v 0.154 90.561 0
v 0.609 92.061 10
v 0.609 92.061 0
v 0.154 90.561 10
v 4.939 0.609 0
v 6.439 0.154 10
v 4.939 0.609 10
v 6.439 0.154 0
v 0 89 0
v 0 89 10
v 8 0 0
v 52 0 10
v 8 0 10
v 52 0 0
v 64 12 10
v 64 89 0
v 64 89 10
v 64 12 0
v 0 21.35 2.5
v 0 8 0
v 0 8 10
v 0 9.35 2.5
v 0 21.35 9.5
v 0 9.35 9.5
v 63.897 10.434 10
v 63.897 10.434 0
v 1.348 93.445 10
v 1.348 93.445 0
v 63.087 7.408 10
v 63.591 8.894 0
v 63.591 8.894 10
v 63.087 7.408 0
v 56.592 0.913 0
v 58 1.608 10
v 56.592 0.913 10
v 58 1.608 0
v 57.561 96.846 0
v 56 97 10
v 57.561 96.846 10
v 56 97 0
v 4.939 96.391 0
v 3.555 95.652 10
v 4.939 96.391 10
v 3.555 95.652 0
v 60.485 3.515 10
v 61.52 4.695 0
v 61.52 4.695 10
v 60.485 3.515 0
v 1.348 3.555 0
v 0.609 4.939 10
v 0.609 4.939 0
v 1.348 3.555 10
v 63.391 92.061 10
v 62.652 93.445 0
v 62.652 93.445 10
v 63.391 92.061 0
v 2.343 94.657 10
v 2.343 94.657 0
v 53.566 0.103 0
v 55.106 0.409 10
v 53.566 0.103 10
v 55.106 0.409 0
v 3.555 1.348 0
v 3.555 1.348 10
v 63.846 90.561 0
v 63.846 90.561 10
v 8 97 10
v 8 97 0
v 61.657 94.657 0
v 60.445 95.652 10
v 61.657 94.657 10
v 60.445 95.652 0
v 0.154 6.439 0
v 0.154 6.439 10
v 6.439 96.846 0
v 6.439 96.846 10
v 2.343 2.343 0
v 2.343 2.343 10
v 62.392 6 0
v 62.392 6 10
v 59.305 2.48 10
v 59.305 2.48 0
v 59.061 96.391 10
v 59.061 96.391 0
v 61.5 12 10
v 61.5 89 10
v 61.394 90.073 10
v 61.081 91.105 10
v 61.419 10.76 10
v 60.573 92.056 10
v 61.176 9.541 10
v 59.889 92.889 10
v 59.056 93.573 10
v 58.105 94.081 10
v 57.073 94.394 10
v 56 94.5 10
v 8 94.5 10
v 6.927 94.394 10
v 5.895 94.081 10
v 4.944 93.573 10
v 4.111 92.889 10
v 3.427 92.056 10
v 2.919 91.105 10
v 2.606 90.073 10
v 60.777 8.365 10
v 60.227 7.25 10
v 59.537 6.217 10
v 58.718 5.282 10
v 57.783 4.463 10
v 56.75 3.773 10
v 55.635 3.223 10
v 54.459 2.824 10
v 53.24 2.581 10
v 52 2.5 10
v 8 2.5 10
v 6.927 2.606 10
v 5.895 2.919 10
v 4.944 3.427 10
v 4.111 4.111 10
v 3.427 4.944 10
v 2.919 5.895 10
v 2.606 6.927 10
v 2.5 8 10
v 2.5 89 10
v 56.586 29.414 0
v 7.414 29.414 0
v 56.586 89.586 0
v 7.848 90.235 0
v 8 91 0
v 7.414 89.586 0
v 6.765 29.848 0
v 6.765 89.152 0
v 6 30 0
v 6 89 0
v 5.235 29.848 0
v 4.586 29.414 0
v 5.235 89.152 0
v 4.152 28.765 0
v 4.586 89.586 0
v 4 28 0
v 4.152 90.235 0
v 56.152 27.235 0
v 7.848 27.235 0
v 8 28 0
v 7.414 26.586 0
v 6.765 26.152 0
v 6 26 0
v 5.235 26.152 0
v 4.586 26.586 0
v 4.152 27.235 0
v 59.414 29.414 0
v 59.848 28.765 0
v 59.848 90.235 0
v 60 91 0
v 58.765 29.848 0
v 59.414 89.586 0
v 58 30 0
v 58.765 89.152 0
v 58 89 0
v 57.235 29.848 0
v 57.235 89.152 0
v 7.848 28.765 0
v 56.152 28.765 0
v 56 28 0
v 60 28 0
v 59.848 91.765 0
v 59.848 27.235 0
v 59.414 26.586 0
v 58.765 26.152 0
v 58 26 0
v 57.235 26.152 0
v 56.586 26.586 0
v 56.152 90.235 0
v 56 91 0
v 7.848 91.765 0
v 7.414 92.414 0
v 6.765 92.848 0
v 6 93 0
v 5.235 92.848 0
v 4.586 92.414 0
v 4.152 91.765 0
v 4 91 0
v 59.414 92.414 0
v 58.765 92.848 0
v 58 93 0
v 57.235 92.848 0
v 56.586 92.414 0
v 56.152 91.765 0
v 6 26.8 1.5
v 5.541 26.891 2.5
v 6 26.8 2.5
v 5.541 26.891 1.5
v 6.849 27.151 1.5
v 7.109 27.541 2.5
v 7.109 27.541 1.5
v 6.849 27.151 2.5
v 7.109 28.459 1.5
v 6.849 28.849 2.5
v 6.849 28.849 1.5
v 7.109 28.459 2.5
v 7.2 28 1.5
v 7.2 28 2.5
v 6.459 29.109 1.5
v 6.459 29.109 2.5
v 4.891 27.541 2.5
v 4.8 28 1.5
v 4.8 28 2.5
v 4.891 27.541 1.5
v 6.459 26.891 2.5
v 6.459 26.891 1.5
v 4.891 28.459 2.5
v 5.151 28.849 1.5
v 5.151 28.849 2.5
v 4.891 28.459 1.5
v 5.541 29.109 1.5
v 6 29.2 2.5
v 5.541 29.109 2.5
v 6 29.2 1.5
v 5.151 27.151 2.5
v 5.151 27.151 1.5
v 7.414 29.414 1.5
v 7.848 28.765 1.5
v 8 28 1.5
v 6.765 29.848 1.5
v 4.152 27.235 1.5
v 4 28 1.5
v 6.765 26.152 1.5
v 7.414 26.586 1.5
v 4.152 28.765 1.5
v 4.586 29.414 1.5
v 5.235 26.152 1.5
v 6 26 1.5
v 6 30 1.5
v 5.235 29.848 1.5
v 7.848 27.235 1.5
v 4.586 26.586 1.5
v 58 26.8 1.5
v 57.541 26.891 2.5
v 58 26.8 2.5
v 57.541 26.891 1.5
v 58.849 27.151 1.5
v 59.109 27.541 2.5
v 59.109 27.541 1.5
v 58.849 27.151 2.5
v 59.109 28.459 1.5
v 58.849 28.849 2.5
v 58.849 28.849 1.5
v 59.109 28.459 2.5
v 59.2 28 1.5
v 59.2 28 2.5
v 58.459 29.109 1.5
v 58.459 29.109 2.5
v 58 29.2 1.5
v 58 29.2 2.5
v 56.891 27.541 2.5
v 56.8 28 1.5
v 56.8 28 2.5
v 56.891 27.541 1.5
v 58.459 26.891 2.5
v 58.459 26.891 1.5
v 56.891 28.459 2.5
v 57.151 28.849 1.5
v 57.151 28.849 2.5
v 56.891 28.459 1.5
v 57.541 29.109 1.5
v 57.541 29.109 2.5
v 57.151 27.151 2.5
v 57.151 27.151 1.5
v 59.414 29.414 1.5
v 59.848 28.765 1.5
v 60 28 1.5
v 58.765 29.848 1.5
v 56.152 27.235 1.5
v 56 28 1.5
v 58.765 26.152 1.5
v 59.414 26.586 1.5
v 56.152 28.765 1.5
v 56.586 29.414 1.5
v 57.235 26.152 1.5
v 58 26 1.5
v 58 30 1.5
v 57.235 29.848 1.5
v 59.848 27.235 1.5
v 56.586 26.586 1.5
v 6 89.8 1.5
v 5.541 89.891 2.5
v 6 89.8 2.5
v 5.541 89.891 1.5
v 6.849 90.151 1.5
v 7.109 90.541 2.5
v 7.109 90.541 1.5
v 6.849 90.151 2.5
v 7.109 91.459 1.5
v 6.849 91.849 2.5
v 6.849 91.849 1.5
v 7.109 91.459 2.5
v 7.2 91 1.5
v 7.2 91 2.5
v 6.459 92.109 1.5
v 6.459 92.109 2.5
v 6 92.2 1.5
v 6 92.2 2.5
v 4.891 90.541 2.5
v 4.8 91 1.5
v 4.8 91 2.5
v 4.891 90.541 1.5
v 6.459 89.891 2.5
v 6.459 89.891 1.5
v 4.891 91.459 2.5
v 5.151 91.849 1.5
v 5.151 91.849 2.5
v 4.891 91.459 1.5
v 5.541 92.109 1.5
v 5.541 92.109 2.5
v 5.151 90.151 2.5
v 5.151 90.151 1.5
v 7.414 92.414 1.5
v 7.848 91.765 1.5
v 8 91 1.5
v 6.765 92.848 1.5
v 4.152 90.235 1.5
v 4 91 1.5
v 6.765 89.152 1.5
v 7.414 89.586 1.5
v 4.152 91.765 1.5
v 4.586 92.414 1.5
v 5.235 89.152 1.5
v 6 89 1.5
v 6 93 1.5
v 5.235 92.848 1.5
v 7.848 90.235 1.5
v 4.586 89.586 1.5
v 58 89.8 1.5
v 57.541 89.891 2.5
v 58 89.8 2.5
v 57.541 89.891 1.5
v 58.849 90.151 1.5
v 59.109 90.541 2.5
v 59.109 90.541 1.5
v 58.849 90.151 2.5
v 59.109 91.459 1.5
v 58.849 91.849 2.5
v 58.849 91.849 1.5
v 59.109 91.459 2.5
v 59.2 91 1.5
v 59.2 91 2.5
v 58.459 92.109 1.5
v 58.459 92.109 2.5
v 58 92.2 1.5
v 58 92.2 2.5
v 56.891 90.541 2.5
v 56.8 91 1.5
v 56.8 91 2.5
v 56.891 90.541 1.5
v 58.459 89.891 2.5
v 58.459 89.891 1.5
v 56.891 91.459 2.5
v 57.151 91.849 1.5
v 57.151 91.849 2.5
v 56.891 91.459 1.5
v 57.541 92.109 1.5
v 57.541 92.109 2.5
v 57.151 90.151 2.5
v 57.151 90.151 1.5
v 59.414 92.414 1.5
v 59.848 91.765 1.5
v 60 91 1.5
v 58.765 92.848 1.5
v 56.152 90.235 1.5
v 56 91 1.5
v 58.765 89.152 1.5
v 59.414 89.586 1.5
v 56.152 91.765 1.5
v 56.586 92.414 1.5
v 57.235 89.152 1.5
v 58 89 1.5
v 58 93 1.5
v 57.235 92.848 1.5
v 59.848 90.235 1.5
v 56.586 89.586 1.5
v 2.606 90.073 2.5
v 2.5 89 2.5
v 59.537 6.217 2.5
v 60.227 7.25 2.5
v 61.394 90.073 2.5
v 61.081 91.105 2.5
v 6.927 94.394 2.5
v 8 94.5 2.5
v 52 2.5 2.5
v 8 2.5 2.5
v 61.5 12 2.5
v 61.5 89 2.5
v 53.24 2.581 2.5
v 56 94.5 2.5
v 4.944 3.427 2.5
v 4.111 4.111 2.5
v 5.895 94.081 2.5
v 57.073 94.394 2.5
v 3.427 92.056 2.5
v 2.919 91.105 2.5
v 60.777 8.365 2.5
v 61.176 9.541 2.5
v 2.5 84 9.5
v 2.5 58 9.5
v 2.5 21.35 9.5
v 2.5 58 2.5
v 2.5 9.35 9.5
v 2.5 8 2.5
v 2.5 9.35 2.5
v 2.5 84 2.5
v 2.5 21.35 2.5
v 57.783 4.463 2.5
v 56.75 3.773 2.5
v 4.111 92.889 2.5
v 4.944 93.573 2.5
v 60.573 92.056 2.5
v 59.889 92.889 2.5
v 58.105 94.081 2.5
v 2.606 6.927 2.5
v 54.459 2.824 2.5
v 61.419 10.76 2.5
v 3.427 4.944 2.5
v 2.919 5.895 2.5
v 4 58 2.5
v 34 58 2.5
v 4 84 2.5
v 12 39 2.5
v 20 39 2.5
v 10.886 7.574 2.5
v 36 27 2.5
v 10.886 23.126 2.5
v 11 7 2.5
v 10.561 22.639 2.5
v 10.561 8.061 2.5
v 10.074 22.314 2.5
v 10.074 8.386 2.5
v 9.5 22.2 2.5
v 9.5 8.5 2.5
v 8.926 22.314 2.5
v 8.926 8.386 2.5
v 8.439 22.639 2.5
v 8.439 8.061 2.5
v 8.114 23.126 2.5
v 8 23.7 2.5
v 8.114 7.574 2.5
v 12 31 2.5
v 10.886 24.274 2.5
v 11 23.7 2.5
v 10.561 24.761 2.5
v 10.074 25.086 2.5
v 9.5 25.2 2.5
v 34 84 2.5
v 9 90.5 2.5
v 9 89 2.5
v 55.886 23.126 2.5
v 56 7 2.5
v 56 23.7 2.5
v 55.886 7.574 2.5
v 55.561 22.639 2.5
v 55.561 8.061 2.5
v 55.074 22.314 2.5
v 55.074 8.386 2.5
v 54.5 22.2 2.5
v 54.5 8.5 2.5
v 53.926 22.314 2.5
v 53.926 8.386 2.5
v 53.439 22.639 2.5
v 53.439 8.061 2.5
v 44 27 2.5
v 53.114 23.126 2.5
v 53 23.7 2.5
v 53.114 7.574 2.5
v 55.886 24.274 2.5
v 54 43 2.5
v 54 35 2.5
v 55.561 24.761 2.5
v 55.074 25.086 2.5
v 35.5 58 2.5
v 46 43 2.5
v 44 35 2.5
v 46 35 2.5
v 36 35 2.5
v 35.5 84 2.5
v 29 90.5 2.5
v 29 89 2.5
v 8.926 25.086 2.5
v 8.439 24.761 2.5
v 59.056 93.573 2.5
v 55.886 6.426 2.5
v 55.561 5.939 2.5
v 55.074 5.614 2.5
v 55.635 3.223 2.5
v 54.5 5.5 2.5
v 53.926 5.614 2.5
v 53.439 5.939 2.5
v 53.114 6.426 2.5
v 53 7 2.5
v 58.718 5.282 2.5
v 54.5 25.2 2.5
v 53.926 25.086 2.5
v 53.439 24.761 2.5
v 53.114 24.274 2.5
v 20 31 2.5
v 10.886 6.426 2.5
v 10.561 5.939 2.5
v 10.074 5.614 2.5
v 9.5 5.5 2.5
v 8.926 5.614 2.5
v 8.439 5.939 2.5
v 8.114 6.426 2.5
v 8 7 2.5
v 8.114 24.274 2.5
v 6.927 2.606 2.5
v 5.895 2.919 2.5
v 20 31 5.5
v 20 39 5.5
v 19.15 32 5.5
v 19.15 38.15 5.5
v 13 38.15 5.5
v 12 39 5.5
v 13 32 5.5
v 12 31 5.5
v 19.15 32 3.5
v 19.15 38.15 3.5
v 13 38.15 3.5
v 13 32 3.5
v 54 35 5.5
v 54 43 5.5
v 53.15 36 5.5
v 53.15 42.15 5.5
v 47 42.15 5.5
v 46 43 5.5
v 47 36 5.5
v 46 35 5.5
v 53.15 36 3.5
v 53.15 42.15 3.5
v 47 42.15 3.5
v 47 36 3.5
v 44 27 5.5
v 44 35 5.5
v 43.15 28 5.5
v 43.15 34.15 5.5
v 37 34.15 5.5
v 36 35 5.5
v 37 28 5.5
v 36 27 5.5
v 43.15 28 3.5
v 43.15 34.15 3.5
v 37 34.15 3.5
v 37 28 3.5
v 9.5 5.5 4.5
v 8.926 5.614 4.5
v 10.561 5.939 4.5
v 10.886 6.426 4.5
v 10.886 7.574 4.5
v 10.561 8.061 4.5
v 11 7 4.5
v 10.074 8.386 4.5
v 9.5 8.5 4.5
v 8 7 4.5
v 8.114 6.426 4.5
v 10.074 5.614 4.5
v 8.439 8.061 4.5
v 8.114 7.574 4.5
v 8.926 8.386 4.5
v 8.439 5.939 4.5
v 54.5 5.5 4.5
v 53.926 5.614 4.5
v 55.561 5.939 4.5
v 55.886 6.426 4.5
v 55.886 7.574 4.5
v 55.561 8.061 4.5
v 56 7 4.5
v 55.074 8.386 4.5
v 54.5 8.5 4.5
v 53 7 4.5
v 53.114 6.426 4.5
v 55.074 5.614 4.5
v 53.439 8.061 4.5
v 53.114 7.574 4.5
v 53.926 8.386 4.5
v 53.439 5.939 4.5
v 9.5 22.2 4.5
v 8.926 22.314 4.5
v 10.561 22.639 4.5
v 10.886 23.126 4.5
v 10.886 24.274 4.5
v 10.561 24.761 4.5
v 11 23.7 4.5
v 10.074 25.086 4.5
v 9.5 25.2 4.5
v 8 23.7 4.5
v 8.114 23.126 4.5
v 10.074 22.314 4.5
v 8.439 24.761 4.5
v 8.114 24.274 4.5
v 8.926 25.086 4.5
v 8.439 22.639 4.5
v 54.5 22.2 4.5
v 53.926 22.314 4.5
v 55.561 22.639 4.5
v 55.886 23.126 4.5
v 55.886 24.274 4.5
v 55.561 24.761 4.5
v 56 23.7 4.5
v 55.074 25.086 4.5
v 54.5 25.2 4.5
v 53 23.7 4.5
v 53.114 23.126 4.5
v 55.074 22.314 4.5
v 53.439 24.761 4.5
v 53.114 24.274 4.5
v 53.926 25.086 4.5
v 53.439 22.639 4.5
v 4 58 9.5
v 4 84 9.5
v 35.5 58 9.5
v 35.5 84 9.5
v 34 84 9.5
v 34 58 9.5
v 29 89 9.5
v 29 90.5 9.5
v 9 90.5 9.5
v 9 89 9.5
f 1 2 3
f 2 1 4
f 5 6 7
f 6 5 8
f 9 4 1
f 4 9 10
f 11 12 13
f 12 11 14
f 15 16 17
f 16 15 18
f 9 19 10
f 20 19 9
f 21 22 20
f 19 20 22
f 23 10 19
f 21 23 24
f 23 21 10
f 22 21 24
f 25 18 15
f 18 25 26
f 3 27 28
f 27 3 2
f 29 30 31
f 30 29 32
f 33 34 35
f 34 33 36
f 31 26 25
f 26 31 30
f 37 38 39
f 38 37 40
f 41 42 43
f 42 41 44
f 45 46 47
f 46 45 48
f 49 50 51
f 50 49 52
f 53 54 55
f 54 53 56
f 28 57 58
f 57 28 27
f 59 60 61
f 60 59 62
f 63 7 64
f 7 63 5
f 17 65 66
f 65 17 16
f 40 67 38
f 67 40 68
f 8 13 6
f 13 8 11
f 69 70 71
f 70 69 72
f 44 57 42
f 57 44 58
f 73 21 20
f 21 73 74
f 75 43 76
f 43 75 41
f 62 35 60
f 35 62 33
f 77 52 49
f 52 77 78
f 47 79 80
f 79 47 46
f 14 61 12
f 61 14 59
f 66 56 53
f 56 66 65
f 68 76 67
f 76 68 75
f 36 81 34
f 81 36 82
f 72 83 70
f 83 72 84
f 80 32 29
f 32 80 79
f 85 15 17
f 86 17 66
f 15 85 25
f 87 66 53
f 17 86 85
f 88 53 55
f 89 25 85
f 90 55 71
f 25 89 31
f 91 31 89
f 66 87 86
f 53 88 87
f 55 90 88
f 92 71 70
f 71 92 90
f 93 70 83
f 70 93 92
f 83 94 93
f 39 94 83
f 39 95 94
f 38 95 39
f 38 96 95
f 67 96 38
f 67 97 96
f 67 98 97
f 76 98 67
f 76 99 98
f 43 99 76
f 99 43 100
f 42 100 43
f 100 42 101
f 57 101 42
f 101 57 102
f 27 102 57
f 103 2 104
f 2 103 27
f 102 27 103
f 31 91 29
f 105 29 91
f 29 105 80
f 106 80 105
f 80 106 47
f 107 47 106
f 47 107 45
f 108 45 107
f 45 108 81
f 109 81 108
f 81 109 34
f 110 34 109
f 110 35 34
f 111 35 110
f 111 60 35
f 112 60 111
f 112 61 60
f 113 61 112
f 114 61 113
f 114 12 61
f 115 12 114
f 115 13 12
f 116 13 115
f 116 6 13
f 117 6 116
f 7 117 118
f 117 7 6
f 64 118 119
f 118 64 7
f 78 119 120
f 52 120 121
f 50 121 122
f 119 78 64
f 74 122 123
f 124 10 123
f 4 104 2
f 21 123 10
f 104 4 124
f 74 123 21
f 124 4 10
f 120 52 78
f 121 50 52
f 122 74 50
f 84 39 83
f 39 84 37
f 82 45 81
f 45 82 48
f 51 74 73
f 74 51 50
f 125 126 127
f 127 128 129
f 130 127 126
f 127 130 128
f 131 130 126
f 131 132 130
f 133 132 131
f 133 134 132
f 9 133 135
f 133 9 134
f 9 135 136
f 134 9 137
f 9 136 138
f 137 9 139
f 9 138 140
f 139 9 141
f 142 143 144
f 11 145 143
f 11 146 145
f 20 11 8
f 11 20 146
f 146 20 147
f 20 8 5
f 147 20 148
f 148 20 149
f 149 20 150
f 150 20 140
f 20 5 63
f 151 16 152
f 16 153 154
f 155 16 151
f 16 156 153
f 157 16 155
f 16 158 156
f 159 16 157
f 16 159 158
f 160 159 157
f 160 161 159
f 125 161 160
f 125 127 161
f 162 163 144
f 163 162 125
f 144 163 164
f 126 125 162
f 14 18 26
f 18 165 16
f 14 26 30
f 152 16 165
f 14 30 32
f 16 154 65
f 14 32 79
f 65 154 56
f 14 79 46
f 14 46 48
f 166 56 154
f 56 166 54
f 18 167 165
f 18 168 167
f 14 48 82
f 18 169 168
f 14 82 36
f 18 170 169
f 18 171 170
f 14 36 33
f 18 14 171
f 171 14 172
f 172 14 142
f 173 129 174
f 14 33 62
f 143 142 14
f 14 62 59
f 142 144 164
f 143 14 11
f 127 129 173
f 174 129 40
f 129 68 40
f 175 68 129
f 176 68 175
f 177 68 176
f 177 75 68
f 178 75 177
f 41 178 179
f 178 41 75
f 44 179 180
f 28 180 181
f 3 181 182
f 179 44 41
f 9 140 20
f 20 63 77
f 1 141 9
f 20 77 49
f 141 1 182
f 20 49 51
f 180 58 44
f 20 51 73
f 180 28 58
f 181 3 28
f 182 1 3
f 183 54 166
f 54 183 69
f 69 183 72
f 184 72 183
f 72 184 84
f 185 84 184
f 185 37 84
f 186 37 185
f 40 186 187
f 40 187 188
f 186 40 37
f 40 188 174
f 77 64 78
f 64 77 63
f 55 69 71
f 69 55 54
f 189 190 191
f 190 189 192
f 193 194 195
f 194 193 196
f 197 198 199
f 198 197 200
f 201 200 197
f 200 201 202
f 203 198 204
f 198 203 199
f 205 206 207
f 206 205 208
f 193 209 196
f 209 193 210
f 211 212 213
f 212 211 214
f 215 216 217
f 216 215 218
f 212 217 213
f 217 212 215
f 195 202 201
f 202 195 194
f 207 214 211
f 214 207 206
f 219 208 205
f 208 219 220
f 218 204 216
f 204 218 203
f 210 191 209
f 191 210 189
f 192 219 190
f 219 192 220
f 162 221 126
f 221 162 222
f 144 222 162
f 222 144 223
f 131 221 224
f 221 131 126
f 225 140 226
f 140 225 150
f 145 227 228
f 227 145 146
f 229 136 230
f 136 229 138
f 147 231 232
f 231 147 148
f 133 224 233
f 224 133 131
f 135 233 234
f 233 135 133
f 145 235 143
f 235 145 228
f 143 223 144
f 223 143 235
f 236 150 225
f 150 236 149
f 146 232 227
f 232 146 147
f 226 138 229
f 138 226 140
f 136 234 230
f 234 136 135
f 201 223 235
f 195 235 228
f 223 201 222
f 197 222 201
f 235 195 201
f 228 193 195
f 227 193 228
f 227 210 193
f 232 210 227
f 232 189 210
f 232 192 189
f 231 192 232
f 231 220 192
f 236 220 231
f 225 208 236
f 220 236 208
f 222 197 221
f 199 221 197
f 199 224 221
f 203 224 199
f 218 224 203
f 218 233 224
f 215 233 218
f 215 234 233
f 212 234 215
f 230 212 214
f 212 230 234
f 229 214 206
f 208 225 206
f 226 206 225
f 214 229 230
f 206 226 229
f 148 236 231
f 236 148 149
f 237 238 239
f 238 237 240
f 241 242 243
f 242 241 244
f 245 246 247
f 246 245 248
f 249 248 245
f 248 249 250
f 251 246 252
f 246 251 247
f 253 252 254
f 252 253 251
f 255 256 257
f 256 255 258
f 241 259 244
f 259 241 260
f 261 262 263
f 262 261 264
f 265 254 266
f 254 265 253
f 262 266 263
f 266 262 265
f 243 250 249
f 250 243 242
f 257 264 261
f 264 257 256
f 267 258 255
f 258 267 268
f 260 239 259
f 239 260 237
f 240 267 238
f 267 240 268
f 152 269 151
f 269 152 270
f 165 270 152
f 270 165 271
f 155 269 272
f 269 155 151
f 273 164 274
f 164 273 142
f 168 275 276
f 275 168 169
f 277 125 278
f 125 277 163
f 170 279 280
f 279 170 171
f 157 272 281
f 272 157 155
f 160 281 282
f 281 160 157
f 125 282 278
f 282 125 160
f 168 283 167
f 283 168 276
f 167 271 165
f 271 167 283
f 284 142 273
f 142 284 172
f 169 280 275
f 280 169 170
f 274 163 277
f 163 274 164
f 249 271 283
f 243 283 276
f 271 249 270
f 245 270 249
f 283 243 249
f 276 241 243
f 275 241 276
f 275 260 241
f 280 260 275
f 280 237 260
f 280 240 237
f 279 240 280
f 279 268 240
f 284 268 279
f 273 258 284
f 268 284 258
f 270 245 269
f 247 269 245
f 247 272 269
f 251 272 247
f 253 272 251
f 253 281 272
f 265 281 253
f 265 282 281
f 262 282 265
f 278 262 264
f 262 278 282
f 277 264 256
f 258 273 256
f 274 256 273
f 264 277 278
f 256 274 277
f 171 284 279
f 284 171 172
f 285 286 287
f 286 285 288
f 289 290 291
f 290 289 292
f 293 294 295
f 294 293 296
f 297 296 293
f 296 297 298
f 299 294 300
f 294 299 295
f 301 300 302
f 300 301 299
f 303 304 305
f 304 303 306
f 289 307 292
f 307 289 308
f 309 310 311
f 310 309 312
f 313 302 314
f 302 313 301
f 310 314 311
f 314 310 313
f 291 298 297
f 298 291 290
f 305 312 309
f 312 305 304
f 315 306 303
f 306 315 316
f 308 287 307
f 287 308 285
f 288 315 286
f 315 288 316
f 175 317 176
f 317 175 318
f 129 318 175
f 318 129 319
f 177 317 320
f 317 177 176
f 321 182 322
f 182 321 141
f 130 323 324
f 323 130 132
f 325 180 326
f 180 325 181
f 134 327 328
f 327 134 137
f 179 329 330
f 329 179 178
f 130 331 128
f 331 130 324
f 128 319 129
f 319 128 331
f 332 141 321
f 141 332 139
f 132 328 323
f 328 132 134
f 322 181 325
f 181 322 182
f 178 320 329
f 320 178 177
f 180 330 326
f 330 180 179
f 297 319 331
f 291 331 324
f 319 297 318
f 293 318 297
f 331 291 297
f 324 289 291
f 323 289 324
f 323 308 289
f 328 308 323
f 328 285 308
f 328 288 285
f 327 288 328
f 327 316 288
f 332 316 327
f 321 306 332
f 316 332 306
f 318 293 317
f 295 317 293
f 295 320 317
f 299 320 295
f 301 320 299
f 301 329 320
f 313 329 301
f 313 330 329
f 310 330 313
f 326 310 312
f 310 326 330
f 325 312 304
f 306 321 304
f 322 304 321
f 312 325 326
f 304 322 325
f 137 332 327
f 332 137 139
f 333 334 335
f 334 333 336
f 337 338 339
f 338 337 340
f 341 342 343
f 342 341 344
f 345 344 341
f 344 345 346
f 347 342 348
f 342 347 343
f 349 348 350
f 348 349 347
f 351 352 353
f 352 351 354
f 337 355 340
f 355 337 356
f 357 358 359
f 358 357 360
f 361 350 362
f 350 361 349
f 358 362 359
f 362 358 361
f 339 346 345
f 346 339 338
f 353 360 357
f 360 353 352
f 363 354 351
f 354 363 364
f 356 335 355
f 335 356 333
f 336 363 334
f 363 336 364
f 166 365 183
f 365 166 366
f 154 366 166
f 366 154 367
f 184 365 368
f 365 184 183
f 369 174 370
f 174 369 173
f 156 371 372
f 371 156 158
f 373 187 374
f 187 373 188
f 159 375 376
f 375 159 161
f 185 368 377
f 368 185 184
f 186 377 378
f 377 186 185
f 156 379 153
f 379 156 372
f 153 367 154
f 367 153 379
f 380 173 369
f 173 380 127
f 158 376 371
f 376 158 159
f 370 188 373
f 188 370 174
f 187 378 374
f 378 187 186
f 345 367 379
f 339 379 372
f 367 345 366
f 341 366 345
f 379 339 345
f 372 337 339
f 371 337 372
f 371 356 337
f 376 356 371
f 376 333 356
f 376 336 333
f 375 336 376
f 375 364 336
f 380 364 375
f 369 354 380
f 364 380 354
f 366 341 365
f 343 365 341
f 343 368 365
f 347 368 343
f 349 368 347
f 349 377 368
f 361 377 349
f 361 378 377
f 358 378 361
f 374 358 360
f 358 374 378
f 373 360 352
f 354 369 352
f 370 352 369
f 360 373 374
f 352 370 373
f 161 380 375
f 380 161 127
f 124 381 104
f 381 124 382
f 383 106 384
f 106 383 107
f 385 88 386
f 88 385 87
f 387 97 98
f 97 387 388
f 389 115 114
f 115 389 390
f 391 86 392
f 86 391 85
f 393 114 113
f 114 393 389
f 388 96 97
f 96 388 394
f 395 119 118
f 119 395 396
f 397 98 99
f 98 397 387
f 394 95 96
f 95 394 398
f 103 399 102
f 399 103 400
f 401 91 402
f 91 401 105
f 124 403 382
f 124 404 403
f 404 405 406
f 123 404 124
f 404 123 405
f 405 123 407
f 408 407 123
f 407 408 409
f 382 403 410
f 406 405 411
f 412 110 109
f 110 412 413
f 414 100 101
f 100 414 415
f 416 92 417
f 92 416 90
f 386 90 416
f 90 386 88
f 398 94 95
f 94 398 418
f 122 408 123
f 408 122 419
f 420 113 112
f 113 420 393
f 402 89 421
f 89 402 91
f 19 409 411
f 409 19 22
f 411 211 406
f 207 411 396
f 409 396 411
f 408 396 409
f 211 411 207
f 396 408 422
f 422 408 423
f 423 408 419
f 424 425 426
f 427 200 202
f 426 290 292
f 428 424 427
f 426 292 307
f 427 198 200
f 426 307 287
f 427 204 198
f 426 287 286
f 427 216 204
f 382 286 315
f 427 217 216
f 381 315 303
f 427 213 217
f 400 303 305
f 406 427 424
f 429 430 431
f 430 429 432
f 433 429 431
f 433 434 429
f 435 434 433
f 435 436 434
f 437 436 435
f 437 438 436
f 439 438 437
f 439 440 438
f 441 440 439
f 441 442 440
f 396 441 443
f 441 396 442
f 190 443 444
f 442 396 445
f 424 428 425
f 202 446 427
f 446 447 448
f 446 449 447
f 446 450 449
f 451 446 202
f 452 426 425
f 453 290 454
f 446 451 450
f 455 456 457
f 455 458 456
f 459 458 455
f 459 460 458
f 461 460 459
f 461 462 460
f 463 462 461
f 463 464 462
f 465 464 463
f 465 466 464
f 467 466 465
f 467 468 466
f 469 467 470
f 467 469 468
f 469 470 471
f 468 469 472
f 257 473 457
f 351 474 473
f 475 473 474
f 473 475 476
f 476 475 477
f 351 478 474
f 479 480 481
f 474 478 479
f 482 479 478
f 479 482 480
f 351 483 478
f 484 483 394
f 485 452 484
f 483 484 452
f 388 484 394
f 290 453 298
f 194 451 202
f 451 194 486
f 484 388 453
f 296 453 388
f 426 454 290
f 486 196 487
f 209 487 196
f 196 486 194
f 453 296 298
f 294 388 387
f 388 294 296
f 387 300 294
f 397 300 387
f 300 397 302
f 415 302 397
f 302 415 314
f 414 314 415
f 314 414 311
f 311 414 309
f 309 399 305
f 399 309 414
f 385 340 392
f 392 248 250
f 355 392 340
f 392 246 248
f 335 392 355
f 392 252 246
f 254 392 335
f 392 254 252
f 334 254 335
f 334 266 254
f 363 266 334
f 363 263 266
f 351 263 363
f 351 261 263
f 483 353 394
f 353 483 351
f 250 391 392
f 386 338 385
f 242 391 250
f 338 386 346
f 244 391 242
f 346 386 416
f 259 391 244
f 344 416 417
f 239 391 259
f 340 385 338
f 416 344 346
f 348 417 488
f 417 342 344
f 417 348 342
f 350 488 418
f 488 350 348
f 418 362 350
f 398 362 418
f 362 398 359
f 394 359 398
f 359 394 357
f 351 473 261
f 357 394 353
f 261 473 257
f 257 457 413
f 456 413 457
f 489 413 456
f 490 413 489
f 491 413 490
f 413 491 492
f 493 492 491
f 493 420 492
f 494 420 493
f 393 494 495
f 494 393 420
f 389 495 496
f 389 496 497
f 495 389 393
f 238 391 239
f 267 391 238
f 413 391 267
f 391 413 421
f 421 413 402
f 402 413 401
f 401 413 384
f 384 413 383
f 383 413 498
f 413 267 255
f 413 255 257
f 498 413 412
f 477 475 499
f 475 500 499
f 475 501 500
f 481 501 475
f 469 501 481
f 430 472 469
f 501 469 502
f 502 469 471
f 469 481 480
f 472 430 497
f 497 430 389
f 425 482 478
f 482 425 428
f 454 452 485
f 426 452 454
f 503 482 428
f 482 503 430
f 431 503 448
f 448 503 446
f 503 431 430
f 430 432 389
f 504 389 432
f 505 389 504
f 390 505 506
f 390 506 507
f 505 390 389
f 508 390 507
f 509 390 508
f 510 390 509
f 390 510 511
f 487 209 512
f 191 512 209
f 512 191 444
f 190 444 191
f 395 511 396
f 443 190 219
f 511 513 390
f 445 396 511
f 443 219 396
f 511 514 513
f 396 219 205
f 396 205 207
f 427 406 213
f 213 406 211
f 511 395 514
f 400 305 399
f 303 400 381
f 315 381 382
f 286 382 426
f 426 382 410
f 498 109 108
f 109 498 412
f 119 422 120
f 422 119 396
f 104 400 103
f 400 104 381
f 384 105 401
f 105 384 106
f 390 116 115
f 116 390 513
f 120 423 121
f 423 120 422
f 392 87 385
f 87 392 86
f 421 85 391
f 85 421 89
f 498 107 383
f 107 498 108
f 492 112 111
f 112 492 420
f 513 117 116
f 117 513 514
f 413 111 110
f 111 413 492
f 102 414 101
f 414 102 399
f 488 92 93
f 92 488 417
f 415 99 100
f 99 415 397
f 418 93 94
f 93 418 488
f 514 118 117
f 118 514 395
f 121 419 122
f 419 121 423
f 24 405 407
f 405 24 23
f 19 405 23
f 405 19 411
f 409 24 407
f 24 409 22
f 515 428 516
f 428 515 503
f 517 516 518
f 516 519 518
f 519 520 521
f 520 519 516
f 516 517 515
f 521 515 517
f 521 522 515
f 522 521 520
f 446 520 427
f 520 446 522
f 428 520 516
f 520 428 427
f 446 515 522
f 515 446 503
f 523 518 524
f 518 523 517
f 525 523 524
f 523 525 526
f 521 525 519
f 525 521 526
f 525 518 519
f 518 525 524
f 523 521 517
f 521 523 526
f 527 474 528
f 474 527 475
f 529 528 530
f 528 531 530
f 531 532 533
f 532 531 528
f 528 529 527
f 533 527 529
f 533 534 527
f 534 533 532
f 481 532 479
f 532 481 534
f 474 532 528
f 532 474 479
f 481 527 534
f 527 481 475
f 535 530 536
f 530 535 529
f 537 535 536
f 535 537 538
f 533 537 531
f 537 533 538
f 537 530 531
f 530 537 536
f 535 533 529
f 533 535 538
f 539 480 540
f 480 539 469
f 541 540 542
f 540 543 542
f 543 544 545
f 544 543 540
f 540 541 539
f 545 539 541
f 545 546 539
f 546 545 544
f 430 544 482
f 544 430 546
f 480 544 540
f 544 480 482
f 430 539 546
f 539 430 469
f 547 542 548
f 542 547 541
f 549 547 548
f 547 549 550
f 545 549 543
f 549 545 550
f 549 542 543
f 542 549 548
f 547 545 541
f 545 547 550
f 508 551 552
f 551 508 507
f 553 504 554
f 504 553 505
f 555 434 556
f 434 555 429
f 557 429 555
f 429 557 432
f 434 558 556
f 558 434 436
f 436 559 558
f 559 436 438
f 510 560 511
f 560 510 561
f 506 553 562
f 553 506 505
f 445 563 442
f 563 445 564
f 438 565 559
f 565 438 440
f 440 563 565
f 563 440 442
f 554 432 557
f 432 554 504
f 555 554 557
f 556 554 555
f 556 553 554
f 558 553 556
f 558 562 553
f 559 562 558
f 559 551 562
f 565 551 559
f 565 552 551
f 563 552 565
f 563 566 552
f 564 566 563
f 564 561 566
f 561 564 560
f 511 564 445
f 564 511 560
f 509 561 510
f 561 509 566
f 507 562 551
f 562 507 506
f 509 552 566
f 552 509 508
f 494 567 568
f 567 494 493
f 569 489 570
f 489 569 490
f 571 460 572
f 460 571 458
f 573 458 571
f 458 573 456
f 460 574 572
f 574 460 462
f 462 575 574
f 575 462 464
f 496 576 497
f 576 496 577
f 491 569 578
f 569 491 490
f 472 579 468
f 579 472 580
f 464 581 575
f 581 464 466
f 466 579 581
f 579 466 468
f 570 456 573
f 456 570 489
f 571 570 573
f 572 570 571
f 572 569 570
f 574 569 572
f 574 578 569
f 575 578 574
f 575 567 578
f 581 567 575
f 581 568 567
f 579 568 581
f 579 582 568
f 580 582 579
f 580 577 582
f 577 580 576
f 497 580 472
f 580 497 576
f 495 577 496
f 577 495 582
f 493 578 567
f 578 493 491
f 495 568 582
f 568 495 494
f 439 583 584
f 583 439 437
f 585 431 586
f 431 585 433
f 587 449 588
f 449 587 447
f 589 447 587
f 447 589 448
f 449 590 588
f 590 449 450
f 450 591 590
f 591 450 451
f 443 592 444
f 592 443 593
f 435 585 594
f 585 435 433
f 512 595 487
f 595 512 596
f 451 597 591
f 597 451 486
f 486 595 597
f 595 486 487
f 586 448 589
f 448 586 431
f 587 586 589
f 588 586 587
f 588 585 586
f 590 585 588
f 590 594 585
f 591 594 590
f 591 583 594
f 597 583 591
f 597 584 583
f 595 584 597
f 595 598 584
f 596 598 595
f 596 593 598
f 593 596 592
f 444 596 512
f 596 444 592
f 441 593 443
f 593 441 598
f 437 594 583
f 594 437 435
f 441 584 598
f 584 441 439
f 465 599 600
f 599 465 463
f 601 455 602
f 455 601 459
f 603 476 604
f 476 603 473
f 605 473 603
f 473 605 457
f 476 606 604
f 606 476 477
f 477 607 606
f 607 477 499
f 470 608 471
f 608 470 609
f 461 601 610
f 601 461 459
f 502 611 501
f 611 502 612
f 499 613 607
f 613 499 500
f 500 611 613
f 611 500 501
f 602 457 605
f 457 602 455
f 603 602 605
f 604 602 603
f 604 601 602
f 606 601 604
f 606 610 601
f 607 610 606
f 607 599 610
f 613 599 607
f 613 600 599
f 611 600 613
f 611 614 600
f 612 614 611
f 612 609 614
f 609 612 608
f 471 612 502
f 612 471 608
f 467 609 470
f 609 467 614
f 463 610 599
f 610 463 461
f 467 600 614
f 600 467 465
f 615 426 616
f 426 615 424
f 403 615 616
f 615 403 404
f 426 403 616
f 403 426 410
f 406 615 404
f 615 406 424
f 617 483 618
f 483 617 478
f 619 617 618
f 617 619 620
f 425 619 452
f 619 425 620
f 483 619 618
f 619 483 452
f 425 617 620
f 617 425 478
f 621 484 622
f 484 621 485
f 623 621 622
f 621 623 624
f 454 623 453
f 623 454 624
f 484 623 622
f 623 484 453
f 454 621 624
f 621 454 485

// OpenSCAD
// =============================================================================
// Mon-Mon Gen 3 - Back Shell
// DMG Game Boy inspired design - screws enter from back
// =============================================================================

// Include parameters (safe to include multiple times)
include <parameters.scad>

// -----------------------------------------------------------------------------
// Helper: Rounded rectangle
// -----------------------------------------------------------------------------
module rounded_rect(width, height, radius, h) {
    hull() {
        translate([radius, radius, 0])
            cylinder(h=h, r=radius, $fn=32);
        translate([width - radius, radius, 0])
            cylinder(h=h, r=radius, $fn=32);
        translate([radius, height - radius, 0])
            cylinder(h=h, r=radius, $fn=32);
        translate([width - radius, height - radius, 0])
            cylinder(h=h, r=radius, $fn=32);
    }
}

// -----------------------------------------------------------------------------
// DMG-style shell outline with curved bottom-right corner
// -----------------------------------------------------------------------------
module dmg_shell_outline_back(h) {
    hull() {
        // Top-left corner
        translate([shell_corner_radius, shell_height - shell_corner_radius, 0])
            cylinder(h=h, r=shell_corner_radius, $fn=32);
        // Top-right corner
        translate([shell_width - shell_corner_radius, shell_height - shell_corner_radius, 0])
            cylinder(h=h, r=shell_corner_radius, $fn=32);
        // Bottom-left corner
        translate([shell_corner_radius, shell_corner_radius, 0])
            cylinder(h=h, r=shell_corner_radius, $fn=32);
        // Bottom-right corner - larger radius for DMG style curve
        translate([shell_width - 12, 12, 0])
            cylinder(h=h, r=12, $fn=48);
    }
}

// -----------------------------------------------------------------------------
// DMG-style interior cavity
// -----------------------------------------------------------------------------
module dmg_interior_cavity_back(h) {
    inset = shell_wall;
    hull() {
        translate([shell_corner_radius, shell_height - shell_corner_radius, 0])
            cylinder(h=h, r=shell_corner_radius - inset, $fn=32);
        translate([shell_width - shell_corner_radius, shell_height - shell_corner_radius, 0])
            cylinder(h=h, r=shell_corner_radius - inset, $fn=32);
        translate([shell_corner_radius, shell_corner_radius, 0])
            cylinder(h=h, r=shell_corner_radius - inset, $fn=32);
        translate([shell_width - 12, 12, 0])
            cylinder(h=h, r=12 - inset, $fn=48);
    }
}

// -----------------------------------------------------------------------------
// Back Shell Main Module
// Screws enter from outside back, thread into bosses in front shell
// -----------------------------------------------------------------------------
module back_shell() {
    difference() {
        union() {
            // Outer shell body - DMG style
            dmg_shell_outline_back(shell_depth_back);

            // Overlap lip (extends up to mate with front shell)
            translate([0, 0, shell_depth_back - 0.01])
            hull() {
                translate([shell_corner_radius, shell_height - shell_corner_radius, 0])
                    cylinder(h=shell_overlap, r=shell_corner_radius - shell_wall - shell_overlap_clearance, $fn=32);
                translate([shell_width - shell_corner_radius, shell_height - shell_corner_radius, 0])
                    cylinder(h=shell_overlap, r=shell_corner_radius - shell_wall - shell_overlap_clearance, $fn=32);
                translate([shell_corner_radius, shell_corner_radius, 0])
                    cylinder(h=shell_overlap, r=shell_corner_radius - shell_wall - shell_overlap_clearance, $fn=32);
                translate([shell_width - 12, 12, 0])
                    cylinder(h=shell_overlap, r=12 - shell_wall - shell_overlap_clearance, $fn=48);
            }
        }

        // Interior cavity - DMG style
        translate([0, 0, shell_wall])
            dmg_interior_cavity_back(shell_depth_back + shell_overlap);

        // USB cutout (left edge - for horizontal ESP32)
        // ESP32 horizontal: y = 4 to 4+22.7 = 26.7, center at y ≈ 15.35
        usb_cutout_y = 4 + esp32_width/2;  // Centered on ESP32 height
        translate([-0.1, usb_cutout_y - usb_cutout_width/2, shell_wall])
            cube([shell_wall + 0.2, usb_cutout_width, usb_cutout_height]);

        // Screw holes with countersinks (screws go through back into front shell bosses)
        // Bottom screws moved up to Y=28 to clear horizontal ESP32 (ends at Y=26.7)
        screw_positions = [
            [screw_inset_x, 28],                                         // Bottom-left (above ESP32)
            [shell_width - screw_inset_x, 28],                           // Bottom-right (above ESP32)
            [screw_inset_x, shell_height - screw_inset_y],               // Top-left
            [shell_width - screw_inset_x, shell_height - screw_inset_y]  // Top-right
        ];

        for (pos = screw_positions) {
            // Through hole for screw shaft
            translate([pos[0], pos[1], -0.1])
                cylinder(h=shell_depth_back + shell_overlap + 0.2, d=2.4, $fn=16);
            // Countersink on outside of back shell
            translate([pos[0], pos[1], -0.1])
                cylinder(h=screw_head_depth + 0.1, d=screw_head_diameter, $fn=16);
        }
    }

    // ----- Internal Features -----

    // ESP32 mounted HORIZONTALLY at bottom (rotated 90°)
    // This places it below all button switches
    // Board: 51mm wide x 22.7mm tall when rotated
    esp32_rot_width = esp32_length;   // 51mm (now horizontal)
    esp32_rot_height = esp32_width;   // 22.7mm (now vertical)
    esp32_rot_x = (shell_width - esp32_rot_width) / 2;  // Centered: ~6.5mm
    esp32_rot_y = 4;  // Near bottom edge

    esp32_standoff_d = 3;

    // Four corner standoffs for horizontal ESP32
    // Bottom-left
    translate([esp32_rot_x + 3, esp32_rot_y + 3, shell_wall])
        cylinder(h=esp32_standoff_height, d=esp32_standoff_d, $fn=16);
    // Bottom-right
    translate([esp32_rot_x + esp32_rot_width - 3, esp32_rot_y + 3, shell_wall])
        cylinder(h=esp32_standoff_height, d=esp32_standoff_d, $fn=16);
    // Top-left
    translate([esp32_rot_x + 3, esp32_rot_y + esp32_rot_height - 3, shell_wall])
        cylinder(h=esp32_standoff_height, d=esp32_standoff_d, $fn=16);
    // Top-right
    translate([esp32_rot_x + esp32_rot_width - 3, esp32_rot_y + esp32_rot_height - 3, shell_wall])
        cylinder(h=esp32_standoff_height, d=esp32_standoff_d, $fn=16);

    // Battery pocket retaining lips
    // Left lip
    translate([battery_x - battery_lip_width, battery_y + 5, shell_wall])
        cube([battery_lip_width, battery_length - 10, battery_height + battery_lip_height]);
    // Right lip
    translate([battery_x + battery_width, battery_y + 5, shell_wall])
        cube([battery_lip_width, battery_length - 10, battery_height + battery_lip_height]);
    // Top lip
    translate([battery_x + 5, battery_y + battery_length, shell_wall])
        cube([battery_width - 10, battery_lip_width, battery_height + battery_lip_height]);

    // D-pad switch platform
    translate([dpad_center_x - tact_switch_size/2 - 1,
               dpad_center_y - tact_switch_size/2 - 1,
               shell_wall]) {
        difference() {
            cube([tact_switch_size + 2, tact_switch_size + 2, 3]);
            // Switch pocket
            translate([1, 1, 1])
                cube([tact_switch_size + tolerance_tight,
                      tact_switch_size + tolerance_tight,
                      3]);
        }
    }

    // A button switch mount (direct mount - no separate plate needed)
    translate([button_a_x - tact_switch_size/2 - 1,
               button_a_y - tact_switch_size/2 - 1,
               shell_wall]) {
        difference() {
            cube([tact_switch_size + 2, tact_switch_size + 2, 3]);
            // Switch pocket
            translate([1, 1, 1])
                cube([tact_switch_size + tolerance_tight,
                      tact_switch_size + tolerance_tight,
                      3]);
        }
    }

    // B button switch mount (direct mount)
    translate([button_b_x - tact_switch_size/2 - 1,
               button_b_y - tact_switch_size/2 - 1,
               shell_wall]) {
        difference() {
            cube([tact_switch_size + 2, tact_switch_size + 2, 3]);
            // Switch pocket
            translate([1, 1, 1])
                cube([tact_switch_size + tolerance_tight,
                      tact_switch_size + tolerance_tight,
                      3]);
        }
    }

    // Wire routing channel (connects battery area to ESP32)
    translate([battery_x + battery_width - 5, esp32_y + esp32_length, shell_wall])
        cube([8, battery_y - esp32_y - esp32_length, 2]);
}

// Preview (renders when opening this file directly)
color(color_shell_back) back_shell();
